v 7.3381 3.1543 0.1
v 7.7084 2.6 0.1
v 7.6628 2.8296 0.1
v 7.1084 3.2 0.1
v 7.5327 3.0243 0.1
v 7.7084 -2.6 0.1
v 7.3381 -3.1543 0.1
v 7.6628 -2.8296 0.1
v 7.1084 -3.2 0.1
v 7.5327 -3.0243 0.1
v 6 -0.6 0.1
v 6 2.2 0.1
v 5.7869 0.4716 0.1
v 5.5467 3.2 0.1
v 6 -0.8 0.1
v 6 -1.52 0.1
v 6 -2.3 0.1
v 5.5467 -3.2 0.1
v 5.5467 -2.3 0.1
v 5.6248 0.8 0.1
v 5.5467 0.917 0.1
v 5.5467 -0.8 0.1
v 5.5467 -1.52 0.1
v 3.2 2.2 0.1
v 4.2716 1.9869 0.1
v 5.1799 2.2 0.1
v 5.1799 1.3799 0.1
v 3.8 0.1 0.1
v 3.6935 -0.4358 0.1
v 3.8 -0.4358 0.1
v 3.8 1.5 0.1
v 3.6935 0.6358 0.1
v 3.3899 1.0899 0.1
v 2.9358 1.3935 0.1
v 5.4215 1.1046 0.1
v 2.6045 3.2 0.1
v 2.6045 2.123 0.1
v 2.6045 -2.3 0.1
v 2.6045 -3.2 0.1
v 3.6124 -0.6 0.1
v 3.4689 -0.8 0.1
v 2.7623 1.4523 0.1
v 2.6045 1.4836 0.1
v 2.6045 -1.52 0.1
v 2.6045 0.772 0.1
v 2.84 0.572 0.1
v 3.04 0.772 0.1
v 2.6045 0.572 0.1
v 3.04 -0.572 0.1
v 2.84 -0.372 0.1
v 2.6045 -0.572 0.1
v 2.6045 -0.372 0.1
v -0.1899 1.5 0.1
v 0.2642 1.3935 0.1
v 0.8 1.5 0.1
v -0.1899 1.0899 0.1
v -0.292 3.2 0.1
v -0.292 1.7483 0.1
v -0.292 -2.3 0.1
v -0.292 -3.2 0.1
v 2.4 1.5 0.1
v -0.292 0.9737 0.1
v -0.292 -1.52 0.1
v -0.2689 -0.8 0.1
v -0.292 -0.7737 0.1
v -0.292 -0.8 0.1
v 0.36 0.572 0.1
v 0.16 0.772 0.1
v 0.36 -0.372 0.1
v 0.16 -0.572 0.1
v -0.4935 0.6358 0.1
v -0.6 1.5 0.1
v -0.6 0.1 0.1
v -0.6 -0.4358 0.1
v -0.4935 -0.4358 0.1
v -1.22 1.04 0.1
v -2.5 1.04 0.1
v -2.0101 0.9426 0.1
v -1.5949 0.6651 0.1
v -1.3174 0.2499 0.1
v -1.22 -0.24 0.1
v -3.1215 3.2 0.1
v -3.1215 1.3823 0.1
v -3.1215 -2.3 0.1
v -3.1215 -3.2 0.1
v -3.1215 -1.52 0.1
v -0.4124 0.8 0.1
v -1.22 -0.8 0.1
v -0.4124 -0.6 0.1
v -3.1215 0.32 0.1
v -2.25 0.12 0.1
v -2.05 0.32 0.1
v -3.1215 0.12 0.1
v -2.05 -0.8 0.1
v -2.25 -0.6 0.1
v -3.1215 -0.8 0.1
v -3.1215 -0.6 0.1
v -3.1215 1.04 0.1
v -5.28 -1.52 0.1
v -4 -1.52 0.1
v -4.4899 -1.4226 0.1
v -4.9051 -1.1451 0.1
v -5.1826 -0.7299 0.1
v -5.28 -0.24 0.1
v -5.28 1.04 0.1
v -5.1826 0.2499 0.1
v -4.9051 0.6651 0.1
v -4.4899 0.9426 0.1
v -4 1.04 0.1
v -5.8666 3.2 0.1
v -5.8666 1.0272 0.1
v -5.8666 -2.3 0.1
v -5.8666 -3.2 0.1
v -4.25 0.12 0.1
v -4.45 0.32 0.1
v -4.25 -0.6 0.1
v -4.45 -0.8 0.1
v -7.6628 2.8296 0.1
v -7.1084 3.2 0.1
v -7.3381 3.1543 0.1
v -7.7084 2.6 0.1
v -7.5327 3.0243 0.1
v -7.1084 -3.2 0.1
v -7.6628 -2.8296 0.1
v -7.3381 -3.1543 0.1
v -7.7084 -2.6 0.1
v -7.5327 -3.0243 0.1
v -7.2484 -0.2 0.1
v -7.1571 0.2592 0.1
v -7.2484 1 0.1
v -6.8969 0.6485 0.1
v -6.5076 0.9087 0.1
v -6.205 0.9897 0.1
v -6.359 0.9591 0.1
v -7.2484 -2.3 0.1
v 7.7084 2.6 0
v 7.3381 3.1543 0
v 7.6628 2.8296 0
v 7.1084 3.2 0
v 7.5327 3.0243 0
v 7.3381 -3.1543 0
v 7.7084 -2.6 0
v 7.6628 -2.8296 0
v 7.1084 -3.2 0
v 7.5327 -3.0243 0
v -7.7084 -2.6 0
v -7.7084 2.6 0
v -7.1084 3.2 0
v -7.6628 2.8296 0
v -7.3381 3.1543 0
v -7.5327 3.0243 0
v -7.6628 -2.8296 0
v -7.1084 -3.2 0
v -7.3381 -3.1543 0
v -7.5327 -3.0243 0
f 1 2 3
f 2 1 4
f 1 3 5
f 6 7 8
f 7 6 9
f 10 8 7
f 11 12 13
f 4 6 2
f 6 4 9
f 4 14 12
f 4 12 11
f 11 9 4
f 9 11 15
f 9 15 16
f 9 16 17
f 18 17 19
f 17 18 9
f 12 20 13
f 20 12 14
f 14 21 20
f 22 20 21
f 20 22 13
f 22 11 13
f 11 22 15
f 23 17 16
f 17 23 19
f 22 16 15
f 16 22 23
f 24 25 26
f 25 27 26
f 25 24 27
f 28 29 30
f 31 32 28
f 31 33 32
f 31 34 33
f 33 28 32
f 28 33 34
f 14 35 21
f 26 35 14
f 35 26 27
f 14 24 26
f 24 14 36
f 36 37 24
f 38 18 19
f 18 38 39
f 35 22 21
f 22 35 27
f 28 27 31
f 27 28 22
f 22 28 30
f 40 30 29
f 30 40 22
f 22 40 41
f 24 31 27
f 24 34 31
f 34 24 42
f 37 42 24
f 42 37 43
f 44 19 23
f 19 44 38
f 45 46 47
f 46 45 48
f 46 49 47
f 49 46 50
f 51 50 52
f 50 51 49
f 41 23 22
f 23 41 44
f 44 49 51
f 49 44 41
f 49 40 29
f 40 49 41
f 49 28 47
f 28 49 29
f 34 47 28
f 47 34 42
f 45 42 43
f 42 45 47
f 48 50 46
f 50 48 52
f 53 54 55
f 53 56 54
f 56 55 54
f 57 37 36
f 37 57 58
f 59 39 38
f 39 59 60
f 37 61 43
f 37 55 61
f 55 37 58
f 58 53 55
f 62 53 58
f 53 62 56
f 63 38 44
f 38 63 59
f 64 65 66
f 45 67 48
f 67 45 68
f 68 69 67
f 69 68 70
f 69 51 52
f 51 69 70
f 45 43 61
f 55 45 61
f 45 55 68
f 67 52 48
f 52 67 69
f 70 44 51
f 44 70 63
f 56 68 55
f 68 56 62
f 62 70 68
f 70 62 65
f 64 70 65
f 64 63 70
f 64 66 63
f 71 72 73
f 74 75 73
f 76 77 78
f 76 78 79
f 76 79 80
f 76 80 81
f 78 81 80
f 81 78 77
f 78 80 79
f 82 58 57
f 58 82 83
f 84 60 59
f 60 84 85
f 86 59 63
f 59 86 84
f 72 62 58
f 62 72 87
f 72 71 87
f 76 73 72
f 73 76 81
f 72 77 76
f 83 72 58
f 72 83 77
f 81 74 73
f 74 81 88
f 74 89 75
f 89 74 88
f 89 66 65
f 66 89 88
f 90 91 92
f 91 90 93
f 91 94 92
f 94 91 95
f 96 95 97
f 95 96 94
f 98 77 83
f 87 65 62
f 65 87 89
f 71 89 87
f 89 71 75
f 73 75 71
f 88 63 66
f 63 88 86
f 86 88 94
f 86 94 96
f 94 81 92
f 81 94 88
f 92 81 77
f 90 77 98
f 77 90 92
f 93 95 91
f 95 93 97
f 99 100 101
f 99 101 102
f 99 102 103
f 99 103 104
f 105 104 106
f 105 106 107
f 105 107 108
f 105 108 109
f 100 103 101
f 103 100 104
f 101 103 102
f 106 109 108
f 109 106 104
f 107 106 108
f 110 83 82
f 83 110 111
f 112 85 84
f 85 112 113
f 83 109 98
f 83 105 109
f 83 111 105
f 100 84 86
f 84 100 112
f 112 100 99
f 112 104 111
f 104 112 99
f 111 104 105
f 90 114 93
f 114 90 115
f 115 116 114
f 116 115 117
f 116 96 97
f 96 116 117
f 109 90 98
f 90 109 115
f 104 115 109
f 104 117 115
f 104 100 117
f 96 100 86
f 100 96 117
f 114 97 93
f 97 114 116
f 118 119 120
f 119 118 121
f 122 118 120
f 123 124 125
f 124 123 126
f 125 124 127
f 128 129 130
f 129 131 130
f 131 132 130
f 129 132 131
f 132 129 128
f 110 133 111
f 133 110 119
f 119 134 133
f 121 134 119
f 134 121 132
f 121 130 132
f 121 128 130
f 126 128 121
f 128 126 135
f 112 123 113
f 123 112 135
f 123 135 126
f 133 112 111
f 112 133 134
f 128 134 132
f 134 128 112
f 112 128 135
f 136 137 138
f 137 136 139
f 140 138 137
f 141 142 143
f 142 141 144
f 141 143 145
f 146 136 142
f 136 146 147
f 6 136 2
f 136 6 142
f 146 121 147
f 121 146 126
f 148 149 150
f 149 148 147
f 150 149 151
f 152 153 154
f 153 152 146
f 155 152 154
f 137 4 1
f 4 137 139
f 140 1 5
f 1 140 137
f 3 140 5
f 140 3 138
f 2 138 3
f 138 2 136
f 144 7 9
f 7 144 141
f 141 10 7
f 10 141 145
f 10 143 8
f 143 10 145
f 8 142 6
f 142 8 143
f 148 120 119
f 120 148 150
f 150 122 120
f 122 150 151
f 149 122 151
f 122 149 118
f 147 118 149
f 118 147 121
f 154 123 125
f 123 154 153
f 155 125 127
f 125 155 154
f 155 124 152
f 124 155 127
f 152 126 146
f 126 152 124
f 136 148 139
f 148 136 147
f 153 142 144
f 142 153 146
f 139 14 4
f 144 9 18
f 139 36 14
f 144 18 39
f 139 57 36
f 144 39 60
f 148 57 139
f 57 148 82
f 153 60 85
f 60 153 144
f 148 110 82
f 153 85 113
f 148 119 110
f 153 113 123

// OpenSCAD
use <../lib.scad>
use <s/6142271ss01.scad>
use <s/6142271ss02.scad>
use <s/6142271ss03.scad>
use <s/6142271ss04.scad>
use <s/6142271ss05.scad>
use <s/6142271ss06.scad>
use <s/6142271ss07.scad>
function ldraw_lib__6142271s() = [
// 0 Sticker  0.8 x  1.9 with Red Taillamp on Black Background Left
// 0 Name: 6142271s.dat
// 0 Author: Massimo Maso [Sirio]
// 0 !LDRAW_ORG Part UPDATE 2025-02
// 0 !LICENSE Licensed under CC BY 4.0 : see CAreadme.txt
// 
// 0 BFC CERTIFY CCW
  [0,"BFC","CERTIFY"],
  [0,"BFC","CCW"],
// 
// 0 !KEYWORDS Audi, Bricklink 75873stk01a, Brickowl 427960, LMS, R8
// 0 !KEYWORDS Rebrickable 24755, Set 75873, Speed Champions, Ultra
// 
// 0 !HISTORY 2025-02-27 [OrionP] Official Update 2025-02
// 
// 
// 1 16 13.8789 0 0 0 0 1 0 1 0 -1 0 0 s\6142271ss01.dat
  [1,16,13.8789,0,0,0,0,1,0,1,0,-1,0,0, ldraw_lib__s__6142271ss01()],
// 1 16 13.8547 0 0 0 0 1 0 1 0 -1 0 0 s\6142271ss02.dat
  [1,16,13.8547,0,0,0,0,1,0,1,0,-1,0,0, ldraw_lib__s__6142271ss02()],
// 1 16 -.7172 0 0 0 0 1 0 1 0 -1 0 0 s\6142271ss03.dat
  [1,16,-.7172,0,0,0,0,1,0,1,0,-1,0,0, ldraw_lib__s__6142271ss03()],
// 1 16 -.7428 0 0 0 0 1 0 1 0 -1 0 0 s\6142271ss04.dat
  [1,16,-.7428,0,0,0,0,1,0,1,0,-1,0,0, ldraw_lib__s__6142271ss04()],
// 1 16 -14.6522 0 0 0 0 1 0 1 0 -1 0 0 s\6142271ss05.dat
  [1,16,-14.6522,0,0,0,0,1,0,1,0,-1,0,0, ldraw_lib__s__6142271ss05()],
// 1 16 -14.681 0 0 0 0 1 0 1 0 -1 0 0 s\6142271ss06.dat
  [1,16,-14.681,0,0,0,0,1,0,1,0,-1,0,0, ldraw_lib__s__6142271ss06()],
// 1 16 0 0 0 0 0 1 0 1 0 -1 0 0 s\6142271ss07.dat
  [1,16,0,0,0,0,0,1,0,1,0,-1,0,0, ldraw_lib__s__6142271ss07()],
];
module ldraw_lib__6142271s(step=0, col=false, unit=2/5, alt=false, line=0.2, solid=!$preview)
    makepoly(ldraw_lib__6142271s(), step=step, col=col, unit=unit, alt=alt, line=line, solid=solid);
ldraw_lib__6142271s(line=0.2);
